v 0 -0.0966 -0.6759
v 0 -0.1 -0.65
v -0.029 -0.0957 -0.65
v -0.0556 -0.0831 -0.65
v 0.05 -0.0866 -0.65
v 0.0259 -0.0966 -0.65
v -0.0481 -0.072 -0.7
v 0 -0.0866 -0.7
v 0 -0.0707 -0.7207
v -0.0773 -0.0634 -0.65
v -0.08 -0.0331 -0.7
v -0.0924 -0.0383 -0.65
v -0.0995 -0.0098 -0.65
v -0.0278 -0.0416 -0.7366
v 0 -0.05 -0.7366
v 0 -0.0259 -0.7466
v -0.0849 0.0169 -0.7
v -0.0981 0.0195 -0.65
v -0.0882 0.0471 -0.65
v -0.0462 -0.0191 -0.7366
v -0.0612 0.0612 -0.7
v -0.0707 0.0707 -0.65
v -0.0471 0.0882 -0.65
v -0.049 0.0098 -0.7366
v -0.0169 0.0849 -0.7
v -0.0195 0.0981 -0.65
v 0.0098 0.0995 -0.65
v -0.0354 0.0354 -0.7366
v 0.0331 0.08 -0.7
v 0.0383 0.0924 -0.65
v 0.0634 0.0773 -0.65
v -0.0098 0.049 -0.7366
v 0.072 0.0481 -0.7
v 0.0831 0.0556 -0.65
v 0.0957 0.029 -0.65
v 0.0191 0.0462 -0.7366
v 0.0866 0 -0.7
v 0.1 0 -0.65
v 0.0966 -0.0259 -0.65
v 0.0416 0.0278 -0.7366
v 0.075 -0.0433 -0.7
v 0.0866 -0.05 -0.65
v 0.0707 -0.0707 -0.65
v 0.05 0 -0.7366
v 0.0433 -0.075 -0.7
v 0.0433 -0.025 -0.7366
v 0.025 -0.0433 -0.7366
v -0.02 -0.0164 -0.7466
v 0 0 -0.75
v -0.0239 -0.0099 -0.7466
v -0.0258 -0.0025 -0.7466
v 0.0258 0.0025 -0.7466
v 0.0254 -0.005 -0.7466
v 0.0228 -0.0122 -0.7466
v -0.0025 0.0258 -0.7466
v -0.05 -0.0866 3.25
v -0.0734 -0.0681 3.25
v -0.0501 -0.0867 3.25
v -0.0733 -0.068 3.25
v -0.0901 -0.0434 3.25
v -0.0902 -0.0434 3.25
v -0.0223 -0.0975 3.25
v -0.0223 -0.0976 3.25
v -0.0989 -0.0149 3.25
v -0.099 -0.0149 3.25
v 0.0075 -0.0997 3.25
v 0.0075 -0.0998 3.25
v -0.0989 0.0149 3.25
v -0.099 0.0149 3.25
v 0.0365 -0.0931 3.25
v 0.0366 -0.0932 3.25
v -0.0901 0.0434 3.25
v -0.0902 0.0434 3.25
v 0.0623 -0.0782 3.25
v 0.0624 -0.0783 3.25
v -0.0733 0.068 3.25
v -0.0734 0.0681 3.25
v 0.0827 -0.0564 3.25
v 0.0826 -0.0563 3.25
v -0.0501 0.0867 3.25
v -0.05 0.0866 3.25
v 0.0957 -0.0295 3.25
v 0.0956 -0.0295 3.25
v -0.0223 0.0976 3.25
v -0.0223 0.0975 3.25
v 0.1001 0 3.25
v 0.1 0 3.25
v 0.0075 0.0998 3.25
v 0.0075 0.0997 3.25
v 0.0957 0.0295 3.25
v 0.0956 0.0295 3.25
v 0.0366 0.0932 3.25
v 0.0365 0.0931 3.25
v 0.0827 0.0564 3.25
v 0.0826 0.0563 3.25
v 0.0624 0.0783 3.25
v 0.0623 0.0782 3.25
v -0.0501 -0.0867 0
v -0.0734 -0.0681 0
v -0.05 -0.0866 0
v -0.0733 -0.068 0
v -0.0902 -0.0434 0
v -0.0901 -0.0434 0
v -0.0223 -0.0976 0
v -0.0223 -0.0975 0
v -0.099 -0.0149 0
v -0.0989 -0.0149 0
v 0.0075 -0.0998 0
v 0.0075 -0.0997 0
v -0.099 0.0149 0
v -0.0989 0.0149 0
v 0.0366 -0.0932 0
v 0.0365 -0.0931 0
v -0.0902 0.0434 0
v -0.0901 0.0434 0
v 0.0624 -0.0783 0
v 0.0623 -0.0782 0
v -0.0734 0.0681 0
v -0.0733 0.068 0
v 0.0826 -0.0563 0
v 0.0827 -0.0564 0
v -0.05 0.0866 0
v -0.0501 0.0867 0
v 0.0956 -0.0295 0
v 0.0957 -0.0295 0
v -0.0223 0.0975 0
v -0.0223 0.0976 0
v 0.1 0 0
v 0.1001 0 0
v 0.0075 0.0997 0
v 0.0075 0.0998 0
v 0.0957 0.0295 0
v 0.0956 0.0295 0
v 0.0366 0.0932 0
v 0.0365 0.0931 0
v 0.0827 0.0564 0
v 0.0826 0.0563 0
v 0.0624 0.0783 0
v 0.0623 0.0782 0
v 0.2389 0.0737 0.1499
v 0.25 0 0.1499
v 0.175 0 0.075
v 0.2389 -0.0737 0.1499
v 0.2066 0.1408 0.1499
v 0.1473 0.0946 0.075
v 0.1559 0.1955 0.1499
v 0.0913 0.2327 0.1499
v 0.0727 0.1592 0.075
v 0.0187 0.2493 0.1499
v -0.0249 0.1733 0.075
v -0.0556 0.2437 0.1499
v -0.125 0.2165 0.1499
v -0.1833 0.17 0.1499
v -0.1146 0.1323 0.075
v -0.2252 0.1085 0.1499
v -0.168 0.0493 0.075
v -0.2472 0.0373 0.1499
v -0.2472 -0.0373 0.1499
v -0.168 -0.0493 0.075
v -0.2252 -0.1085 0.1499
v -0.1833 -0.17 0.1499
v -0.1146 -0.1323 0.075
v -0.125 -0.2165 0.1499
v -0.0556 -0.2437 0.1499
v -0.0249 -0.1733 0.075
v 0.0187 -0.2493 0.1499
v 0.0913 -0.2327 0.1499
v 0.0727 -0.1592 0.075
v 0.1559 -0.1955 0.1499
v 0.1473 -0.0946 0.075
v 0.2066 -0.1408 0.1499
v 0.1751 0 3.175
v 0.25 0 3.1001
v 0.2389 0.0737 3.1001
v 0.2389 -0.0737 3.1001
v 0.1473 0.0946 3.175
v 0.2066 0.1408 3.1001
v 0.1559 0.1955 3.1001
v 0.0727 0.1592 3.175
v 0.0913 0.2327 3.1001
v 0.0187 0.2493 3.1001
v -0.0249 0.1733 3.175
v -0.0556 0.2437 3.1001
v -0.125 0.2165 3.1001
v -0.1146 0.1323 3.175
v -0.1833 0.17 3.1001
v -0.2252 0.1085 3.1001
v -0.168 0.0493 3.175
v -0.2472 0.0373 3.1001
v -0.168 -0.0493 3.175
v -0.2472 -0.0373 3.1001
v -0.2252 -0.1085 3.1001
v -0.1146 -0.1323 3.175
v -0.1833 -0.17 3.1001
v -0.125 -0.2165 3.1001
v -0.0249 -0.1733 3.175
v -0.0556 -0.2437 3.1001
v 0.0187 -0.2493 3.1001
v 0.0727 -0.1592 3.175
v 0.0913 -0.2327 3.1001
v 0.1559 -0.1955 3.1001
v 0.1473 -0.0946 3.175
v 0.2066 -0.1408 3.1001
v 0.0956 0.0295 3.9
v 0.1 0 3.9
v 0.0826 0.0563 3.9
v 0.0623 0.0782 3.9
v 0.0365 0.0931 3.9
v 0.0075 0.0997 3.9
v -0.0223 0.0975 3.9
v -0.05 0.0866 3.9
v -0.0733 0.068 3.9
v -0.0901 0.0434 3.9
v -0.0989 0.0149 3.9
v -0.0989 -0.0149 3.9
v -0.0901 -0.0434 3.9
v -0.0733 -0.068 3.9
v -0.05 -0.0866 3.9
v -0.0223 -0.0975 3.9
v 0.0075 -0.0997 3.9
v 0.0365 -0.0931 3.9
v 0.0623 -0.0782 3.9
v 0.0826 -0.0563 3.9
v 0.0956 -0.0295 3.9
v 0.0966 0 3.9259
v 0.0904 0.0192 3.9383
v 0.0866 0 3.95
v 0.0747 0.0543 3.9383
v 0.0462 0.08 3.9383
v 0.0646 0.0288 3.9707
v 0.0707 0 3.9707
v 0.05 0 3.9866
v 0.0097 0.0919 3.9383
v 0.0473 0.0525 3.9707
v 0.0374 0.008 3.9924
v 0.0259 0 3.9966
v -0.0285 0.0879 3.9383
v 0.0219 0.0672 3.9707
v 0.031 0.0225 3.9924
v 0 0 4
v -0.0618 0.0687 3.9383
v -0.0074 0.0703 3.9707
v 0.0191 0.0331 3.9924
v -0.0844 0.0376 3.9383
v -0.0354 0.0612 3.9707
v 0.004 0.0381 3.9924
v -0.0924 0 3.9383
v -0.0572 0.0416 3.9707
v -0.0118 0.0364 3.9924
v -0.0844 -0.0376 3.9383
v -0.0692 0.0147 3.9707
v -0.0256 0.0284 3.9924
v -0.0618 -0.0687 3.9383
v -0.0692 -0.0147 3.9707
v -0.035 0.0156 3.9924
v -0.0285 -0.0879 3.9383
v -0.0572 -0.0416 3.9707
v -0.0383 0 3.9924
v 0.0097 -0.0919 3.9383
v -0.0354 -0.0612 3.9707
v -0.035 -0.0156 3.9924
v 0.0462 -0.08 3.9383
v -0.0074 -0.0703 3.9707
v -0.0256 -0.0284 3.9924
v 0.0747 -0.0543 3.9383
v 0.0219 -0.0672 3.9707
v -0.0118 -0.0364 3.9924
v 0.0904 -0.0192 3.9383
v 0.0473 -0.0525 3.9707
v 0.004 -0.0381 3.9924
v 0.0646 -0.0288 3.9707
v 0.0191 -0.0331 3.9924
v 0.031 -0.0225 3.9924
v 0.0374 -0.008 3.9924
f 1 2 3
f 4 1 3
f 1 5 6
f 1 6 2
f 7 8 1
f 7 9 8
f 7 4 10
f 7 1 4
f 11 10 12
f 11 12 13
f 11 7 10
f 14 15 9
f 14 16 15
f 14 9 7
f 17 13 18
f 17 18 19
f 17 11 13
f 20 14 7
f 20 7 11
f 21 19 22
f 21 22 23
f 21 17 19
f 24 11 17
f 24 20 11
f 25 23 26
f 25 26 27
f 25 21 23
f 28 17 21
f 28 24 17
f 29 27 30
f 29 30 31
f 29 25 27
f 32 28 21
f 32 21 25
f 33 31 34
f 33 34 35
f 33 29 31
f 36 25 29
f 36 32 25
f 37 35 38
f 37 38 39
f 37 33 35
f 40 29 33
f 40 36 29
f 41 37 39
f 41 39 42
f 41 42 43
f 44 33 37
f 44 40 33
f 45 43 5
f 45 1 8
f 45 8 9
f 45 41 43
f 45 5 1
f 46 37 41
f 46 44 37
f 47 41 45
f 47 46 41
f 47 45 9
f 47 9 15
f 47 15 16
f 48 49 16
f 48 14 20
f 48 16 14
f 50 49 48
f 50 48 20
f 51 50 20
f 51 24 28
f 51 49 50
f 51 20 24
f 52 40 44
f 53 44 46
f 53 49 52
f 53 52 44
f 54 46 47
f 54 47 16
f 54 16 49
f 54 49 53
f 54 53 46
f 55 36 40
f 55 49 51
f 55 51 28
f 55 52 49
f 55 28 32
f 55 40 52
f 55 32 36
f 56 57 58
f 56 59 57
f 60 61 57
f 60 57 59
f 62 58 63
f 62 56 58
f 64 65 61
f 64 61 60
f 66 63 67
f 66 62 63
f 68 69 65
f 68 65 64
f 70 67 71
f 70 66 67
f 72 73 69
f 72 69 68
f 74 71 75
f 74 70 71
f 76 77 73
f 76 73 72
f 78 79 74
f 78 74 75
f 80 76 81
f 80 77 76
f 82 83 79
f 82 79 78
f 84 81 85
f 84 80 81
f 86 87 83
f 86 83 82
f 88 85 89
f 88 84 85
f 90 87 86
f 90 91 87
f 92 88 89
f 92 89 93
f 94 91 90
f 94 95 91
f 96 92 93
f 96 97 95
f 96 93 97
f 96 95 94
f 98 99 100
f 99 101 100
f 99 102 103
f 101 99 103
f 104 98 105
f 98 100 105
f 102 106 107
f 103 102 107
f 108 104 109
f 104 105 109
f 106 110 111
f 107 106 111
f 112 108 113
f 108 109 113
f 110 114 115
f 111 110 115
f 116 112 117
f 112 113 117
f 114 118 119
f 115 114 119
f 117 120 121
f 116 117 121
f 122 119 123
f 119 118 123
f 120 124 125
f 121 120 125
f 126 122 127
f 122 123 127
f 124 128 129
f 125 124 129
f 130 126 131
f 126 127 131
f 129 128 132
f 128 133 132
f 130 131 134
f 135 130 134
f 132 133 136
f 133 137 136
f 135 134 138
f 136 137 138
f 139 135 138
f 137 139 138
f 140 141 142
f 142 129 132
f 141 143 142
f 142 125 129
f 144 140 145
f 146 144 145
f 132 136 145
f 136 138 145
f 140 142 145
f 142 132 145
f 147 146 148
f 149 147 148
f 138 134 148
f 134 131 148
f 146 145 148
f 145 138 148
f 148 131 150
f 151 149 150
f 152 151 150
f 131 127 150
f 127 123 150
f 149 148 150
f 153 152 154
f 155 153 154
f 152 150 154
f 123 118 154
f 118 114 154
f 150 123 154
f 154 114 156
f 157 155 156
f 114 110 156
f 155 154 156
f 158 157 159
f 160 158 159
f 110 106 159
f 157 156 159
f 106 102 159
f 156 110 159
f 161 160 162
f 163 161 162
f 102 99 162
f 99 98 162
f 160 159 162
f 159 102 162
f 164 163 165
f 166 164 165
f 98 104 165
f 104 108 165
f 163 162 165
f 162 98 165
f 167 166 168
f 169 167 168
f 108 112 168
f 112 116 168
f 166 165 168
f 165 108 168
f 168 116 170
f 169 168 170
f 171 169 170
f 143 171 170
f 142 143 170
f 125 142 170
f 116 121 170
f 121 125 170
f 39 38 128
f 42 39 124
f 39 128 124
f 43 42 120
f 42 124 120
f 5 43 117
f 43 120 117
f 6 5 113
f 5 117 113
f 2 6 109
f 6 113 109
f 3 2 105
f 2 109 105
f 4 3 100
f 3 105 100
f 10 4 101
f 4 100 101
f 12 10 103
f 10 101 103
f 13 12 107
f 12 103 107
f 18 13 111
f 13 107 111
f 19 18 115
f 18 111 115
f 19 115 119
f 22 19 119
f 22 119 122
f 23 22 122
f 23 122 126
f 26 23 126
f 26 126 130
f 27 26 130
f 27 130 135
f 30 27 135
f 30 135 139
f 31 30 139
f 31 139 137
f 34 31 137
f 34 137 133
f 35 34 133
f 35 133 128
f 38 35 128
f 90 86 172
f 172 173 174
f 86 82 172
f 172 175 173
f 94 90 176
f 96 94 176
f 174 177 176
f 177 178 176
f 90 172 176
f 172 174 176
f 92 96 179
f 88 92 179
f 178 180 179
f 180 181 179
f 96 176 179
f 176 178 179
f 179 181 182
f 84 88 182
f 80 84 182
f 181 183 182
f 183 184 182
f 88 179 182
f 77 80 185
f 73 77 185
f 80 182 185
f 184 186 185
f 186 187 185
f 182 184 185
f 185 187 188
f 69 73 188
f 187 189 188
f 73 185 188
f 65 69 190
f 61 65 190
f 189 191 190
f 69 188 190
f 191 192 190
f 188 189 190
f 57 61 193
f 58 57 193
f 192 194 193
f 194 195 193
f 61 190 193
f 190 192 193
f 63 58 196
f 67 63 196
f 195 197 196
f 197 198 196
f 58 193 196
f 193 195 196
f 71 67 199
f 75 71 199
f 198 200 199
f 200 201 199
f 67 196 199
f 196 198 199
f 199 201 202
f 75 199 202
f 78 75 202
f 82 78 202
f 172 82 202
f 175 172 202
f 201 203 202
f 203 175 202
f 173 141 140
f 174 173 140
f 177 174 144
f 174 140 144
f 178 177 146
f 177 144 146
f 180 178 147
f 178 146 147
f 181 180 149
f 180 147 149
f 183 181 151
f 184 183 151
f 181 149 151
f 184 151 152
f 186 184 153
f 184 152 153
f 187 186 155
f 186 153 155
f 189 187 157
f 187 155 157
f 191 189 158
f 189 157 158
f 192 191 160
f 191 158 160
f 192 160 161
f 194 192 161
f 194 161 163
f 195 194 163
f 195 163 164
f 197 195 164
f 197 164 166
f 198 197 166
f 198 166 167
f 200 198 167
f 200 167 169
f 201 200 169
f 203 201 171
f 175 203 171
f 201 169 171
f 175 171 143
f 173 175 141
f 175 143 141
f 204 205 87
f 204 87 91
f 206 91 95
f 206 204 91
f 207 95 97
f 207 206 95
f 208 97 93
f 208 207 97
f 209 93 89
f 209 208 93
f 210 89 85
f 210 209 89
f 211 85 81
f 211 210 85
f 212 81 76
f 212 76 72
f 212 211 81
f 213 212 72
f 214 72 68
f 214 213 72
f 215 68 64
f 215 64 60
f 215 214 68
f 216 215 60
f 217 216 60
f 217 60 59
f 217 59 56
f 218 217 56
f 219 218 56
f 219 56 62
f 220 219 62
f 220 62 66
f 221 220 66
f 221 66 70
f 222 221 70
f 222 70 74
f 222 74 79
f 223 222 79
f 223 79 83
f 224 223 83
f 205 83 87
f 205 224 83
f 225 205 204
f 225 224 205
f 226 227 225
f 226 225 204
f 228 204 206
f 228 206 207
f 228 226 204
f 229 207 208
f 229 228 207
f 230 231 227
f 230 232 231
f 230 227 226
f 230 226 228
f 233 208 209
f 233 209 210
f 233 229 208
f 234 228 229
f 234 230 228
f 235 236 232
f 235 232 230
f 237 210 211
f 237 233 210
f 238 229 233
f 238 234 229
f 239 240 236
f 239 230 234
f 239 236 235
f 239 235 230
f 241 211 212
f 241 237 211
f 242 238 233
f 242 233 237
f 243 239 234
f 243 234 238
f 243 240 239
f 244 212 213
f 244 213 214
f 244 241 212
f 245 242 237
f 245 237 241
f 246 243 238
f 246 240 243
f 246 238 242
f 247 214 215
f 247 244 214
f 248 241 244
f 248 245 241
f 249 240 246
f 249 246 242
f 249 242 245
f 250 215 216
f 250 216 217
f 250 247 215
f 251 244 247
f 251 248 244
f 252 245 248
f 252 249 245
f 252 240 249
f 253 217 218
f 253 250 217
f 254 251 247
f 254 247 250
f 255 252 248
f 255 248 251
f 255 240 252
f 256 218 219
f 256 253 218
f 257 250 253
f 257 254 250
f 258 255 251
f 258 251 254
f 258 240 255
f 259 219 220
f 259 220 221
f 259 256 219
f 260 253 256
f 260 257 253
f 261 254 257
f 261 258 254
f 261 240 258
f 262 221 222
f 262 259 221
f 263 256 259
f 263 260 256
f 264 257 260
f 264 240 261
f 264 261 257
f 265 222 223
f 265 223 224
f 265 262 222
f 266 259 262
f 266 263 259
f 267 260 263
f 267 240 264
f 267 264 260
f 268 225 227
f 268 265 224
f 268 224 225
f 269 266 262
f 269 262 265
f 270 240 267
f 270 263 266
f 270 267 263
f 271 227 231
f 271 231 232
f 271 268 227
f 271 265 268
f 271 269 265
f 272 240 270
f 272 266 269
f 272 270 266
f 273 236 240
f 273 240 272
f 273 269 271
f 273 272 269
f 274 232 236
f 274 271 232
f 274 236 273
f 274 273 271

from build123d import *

# Parameters (mm, degrees)
CROQUIS1_R              = 0.25
SALIENTE_EXTRUIR1_DEPTH = 3.25
CROQUIS2_R              = 0.1
SALIENTE_EXTRUIR2_DEPTH = 0.65
SALIENTE_EXTRUIR3_START = 0.65
CROQUIS3_R              = 0.1
SALIENTE_EXTRUIR3_DEPTH = 0.65
C_PULA1_FACE_RADIUS     = 0.1
C_PULA1_HEIGHT          = 0.1
CHAFL_N2_SIZE           = 0.15


# Read off the part's stored shape, not the designer's step: Cúpula2
with BuildPart() as part:
    # Croquis1 → Saliente-Extruir1 (new body)
    with BuildSketch(Plane.XY):
        Circle(CROQUIS1_R)
    extrude(amount=SALIENTE_EXTRUIR1_DEPTH)

    # Croquis2 → Saliente-Extruir2 (add)
    with BuildSketch(Plane(origin=(0, 0, 0), x_dir=(-1, 0, 0), z_dir=(0, 0, -1))):
        with Locations(Location((0, 0, 0), (0, 0, 180))):
            Circle(CROQUIS2_R)
    extrude(amount=SALIENTE_EXTRUIR2_DEPTH)

    # Croquis3 → Saliente-Extruir3 (add)
    with BuildSketch(Plane.XY.offset(3.25).offset(SALIENTE_EXTRUIR3_START)):
        Circle(CROQUIS3_R)
    extrude(amount=-SALIENTE_EXTRUIR3_DEPTH)

    # Cúpula1: an elliptical dome of height H over a round flat face of radius A is half a spheroid: the quarter ellipse of half axes A and H revolved about the face's axis
    with BuildSketch(Plane((0, 0, -0.65), x_dir=(0, -1, 0), z_dir=(1, 0, 0)), mode=Mode.PRIVATE) as c_pula1_quarter:
        Ellipse(C_PULA1_FACE_RADIUS, C_PULA1_HEIGHT)
        Rectangle(C_PULA1_FACE_RADIUS, C_PULA1_HEIGHT, align=(Align.MIN, Align.MIN), mode=Mode.INTERSECT)
    revolve(c_pula1_quarter.sketch, axis=Axis((0, 0, -0.65), (0, 0, -1)))

    # Cúpula2 outline → Cúpula2 (revolve)
    with BuildSketch(Plane.XZ):
        with BuildLine():
            Line((0, 3.9), (0.1, 3.9))
            ThreePointArc((0.1, 3.9), (0.070710678, 3.970710678), (0, 4))
            Line((0, 4), (0, 3.9))
        make_face()
    revolve(axis=Axis((0, 0, 0), (0, 0, 1)))

    # Chaflán2
    chafl_n2_edges = [part.edges().sort_by_distance(p)[0] for p in [
        (-0.25, 0, 0),
        (-0.25, 0, 3.25),
    ]]
    chamfer(chafl_n2_edges, length=CHAFL_N2_SIZE - 0.0001)  # a hair under: the kernel refuses the full size


solid = part.part
